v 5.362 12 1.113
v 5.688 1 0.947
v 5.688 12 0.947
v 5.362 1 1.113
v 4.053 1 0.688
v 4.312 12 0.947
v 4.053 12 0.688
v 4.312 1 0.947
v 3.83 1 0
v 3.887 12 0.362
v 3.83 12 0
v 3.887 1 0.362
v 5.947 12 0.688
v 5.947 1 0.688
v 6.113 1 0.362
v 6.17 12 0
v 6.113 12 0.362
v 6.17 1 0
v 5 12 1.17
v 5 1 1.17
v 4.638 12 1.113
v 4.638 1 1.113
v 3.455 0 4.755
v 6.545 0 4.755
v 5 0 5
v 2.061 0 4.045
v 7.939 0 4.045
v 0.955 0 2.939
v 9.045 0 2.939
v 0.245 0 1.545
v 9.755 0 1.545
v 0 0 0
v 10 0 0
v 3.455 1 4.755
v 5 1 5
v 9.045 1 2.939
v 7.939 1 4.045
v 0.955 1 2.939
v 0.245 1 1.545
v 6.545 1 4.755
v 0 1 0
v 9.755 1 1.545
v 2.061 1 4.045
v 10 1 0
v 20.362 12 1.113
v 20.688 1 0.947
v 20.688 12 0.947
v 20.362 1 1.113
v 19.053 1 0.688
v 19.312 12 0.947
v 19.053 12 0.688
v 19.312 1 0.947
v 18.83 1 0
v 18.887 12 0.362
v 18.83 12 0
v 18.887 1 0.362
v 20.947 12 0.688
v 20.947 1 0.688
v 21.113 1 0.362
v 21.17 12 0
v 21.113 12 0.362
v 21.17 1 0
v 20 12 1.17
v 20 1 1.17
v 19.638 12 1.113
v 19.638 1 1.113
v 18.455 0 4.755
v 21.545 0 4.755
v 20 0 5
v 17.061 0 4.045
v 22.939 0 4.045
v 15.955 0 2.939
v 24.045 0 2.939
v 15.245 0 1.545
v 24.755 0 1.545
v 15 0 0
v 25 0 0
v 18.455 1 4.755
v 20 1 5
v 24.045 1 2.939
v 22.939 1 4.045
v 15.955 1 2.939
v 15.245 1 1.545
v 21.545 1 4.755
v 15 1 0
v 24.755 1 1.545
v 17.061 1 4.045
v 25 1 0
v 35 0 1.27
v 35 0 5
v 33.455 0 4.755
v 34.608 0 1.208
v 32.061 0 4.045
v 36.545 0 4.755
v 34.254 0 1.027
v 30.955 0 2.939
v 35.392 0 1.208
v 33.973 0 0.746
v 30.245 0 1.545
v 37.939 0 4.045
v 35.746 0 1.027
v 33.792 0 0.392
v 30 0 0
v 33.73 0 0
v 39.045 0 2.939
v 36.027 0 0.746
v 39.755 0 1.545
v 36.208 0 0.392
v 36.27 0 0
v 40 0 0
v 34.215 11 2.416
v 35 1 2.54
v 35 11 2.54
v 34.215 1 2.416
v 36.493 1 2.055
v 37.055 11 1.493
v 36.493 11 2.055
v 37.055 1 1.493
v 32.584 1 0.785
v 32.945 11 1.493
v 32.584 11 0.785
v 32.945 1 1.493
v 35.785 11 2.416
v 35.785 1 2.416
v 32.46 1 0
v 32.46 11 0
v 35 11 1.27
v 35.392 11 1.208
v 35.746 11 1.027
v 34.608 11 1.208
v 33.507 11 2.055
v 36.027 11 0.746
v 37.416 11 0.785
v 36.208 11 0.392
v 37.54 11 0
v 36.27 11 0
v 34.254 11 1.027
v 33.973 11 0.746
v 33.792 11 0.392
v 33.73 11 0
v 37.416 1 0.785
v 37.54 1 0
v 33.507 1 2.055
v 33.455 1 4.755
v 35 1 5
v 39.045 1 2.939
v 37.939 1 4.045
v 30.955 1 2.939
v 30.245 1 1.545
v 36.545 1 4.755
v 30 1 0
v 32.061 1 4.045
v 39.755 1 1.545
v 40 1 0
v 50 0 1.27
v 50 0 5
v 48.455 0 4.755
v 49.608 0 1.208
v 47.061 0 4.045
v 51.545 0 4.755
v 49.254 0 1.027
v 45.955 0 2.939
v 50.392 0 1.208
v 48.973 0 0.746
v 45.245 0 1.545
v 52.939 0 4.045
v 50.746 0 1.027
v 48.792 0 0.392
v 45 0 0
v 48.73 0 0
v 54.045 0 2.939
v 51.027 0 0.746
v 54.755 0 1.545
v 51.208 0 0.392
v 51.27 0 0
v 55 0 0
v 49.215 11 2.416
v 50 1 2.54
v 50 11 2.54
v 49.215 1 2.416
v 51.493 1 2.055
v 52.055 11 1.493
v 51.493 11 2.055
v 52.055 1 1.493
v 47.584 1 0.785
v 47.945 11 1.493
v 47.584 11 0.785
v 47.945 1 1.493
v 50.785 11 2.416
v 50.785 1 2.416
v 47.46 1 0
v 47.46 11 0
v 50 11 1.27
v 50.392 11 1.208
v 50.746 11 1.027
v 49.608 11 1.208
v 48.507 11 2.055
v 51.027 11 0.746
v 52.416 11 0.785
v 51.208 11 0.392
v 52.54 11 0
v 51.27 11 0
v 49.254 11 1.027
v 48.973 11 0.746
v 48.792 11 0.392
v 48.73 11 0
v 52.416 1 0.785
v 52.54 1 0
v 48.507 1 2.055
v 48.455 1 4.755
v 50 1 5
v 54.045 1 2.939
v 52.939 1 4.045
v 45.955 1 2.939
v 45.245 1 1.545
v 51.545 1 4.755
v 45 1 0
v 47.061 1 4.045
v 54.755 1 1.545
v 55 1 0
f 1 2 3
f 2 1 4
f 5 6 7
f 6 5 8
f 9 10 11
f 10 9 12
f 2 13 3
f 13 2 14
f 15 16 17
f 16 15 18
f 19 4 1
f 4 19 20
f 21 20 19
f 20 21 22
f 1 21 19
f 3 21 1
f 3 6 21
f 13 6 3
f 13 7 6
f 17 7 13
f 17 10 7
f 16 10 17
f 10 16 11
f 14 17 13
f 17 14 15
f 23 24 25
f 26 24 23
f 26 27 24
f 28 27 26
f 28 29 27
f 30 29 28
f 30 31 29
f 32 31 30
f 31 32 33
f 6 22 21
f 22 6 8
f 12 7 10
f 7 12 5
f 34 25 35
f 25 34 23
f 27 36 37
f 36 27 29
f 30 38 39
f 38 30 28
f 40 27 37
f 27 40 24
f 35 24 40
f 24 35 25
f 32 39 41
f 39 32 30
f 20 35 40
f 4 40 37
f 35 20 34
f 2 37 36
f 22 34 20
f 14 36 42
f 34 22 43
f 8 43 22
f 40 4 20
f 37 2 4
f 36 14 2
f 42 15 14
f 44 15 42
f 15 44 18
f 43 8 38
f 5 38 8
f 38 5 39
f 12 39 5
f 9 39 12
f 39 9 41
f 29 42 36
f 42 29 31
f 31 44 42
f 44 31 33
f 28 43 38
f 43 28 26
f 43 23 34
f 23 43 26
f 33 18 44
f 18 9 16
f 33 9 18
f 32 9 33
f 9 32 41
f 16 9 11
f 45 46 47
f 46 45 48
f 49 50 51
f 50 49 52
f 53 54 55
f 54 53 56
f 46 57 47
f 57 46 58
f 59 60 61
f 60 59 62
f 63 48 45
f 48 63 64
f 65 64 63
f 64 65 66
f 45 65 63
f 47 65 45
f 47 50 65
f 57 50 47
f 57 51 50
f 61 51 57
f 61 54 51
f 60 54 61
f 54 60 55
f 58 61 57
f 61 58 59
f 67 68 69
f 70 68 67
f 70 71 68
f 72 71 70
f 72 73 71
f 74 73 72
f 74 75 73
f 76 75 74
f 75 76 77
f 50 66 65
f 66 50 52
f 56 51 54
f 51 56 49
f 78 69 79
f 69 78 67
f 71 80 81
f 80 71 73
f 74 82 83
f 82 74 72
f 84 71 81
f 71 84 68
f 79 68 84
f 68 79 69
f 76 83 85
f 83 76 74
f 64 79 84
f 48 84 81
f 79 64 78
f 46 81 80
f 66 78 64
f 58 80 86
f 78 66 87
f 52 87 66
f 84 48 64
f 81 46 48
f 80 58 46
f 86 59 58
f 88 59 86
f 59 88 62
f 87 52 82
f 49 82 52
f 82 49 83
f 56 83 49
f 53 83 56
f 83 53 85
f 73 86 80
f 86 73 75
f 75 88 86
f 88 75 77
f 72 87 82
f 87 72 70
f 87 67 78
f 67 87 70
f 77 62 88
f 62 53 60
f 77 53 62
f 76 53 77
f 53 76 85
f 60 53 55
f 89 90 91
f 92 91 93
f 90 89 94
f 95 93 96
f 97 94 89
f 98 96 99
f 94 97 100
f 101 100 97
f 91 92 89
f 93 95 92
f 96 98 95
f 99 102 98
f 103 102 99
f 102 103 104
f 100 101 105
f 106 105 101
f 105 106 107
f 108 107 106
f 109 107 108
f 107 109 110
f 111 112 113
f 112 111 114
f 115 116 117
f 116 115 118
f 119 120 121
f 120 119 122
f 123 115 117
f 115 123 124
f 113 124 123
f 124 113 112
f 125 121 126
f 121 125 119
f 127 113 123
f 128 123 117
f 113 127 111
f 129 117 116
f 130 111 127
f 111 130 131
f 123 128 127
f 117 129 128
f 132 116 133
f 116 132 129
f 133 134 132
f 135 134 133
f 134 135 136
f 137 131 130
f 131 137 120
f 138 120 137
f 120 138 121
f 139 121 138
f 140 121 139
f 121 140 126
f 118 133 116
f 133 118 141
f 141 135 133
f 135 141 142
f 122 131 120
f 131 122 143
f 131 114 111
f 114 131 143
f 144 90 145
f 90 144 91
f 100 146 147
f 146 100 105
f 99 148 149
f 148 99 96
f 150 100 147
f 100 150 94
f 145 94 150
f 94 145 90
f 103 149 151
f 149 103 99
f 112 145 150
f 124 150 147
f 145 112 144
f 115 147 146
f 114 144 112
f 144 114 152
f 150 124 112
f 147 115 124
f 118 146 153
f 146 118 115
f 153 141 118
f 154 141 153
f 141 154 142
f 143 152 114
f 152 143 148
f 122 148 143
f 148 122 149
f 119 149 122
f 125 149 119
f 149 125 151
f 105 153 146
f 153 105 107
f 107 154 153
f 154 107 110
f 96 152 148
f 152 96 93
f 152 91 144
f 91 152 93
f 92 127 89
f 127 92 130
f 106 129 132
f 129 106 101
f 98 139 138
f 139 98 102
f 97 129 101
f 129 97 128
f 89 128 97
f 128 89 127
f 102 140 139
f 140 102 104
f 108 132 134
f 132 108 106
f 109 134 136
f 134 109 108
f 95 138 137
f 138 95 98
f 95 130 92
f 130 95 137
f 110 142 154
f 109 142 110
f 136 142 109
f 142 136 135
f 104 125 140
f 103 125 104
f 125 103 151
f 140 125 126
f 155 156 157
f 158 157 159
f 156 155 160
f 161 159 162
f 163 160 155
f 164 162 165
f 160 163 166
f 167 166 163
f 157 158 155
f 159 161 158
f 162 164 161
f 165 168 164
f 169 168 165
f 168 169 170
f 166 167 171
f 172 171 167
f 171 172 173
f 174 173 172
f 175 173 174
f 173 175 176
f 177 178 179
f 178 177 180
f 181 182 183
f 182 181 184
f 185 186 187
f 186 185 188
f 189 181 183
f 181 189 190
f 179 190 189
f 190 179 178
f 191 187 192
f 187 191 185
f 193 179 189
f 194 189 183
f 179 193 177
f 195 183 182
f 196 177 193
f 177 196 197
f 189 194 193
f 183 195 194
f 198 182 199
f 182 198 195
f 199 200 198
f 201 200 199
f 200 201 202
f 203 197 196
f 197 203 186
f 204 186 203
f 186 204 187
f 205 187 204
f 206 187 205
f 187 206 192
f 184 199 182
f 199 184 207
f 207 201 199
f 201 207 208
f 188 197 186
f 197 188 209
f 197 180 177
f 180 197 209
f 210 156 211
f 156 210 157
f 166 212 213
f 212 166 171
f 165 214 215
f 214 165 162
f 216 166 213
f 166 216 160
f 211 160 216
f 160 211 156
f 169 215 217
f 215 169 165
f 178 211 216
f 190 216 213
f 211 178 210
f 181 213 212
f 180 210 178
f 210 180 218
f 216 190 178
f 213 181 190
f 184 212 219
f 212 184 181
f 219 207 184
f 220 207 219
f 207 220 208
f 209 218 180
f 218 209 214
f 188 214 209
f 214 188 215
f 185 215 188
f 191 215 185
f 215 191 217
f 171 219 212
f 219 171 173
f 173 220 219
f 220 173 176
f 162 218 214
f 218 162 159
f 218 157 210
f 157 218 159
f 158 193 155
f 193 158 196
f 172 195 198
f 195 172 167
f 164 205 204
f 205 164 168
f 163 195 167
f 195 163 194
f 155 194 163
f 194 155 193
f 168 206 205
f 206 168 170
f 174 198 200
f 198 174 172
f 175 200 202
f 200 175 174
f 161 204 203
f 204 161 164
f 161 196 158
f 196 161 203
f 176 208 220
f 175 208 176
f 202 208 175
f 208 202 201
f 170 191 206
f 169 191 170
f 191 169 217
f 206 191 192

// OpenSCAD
$fn=20;
HeadHeight=1; // [1,1.5,2,2.5,3]
HeadDiameter=10; //[7:15]
SleeveLength=10; //[1:100]
SleeveOutterDiameter=5.08;//[5.00,5.08,6,7,8,9,10]
Play=0.1;// [0.0,0.1,0.2,0.3,0.4,0.5]

HeadRadius=HeadDiameter/2;
SleeveOutterRadius=SleeveOutterDiameter/2;
SleeveInnerRadius=(SleeveOutterRadius/2)-Play;

O1=HeadDiameter/2;
O2=HeadDiameter+10;
O3=(HeadDiameter*2)+15;
O4=(HeadDiameter*3)+20;

translate([O1,0,0]) core();
translate([O2,0,0]) core();
translate([O3,0,0]) outter();
translate([O4,0,0]) outter();

module core() {
	difference() {
		union() {
			rotate([-90,0,0]) cylinder(r=SleeveInnerRadius,h=SleeveLength+(HeadHeight*2));
			rotate([-90,0,0]) cylinder(r=HeadRadius,h=HeadHeight);
		}
		translate([-HeadRadius,0,-HeadRadius]) cube([HeadDiameter+1,SleeveLength+(HeadHeight*2)+1,HeadRadius]);
	}
}

module outter() {
	difference() {
		union() {
			rotate([-90,0,0]) cylinder(r=SleeveOutterRadius,h=SleeveLength+HeadHeight);
			rotate([-90,0,0]) cylinder(r=HeadRadius,h=HeadHeight);
		}
		rotate([-90,0,0]) cylinder(r=SleeveInnerRadius+Play,h=SleeveLength+HeadHeight);
		translate([-HeadRadius,0,-HeadRadius]) cube([HeadDiameter+1,SleeveLength+HeadHeight+1,HeadRadius]);
	}
}
